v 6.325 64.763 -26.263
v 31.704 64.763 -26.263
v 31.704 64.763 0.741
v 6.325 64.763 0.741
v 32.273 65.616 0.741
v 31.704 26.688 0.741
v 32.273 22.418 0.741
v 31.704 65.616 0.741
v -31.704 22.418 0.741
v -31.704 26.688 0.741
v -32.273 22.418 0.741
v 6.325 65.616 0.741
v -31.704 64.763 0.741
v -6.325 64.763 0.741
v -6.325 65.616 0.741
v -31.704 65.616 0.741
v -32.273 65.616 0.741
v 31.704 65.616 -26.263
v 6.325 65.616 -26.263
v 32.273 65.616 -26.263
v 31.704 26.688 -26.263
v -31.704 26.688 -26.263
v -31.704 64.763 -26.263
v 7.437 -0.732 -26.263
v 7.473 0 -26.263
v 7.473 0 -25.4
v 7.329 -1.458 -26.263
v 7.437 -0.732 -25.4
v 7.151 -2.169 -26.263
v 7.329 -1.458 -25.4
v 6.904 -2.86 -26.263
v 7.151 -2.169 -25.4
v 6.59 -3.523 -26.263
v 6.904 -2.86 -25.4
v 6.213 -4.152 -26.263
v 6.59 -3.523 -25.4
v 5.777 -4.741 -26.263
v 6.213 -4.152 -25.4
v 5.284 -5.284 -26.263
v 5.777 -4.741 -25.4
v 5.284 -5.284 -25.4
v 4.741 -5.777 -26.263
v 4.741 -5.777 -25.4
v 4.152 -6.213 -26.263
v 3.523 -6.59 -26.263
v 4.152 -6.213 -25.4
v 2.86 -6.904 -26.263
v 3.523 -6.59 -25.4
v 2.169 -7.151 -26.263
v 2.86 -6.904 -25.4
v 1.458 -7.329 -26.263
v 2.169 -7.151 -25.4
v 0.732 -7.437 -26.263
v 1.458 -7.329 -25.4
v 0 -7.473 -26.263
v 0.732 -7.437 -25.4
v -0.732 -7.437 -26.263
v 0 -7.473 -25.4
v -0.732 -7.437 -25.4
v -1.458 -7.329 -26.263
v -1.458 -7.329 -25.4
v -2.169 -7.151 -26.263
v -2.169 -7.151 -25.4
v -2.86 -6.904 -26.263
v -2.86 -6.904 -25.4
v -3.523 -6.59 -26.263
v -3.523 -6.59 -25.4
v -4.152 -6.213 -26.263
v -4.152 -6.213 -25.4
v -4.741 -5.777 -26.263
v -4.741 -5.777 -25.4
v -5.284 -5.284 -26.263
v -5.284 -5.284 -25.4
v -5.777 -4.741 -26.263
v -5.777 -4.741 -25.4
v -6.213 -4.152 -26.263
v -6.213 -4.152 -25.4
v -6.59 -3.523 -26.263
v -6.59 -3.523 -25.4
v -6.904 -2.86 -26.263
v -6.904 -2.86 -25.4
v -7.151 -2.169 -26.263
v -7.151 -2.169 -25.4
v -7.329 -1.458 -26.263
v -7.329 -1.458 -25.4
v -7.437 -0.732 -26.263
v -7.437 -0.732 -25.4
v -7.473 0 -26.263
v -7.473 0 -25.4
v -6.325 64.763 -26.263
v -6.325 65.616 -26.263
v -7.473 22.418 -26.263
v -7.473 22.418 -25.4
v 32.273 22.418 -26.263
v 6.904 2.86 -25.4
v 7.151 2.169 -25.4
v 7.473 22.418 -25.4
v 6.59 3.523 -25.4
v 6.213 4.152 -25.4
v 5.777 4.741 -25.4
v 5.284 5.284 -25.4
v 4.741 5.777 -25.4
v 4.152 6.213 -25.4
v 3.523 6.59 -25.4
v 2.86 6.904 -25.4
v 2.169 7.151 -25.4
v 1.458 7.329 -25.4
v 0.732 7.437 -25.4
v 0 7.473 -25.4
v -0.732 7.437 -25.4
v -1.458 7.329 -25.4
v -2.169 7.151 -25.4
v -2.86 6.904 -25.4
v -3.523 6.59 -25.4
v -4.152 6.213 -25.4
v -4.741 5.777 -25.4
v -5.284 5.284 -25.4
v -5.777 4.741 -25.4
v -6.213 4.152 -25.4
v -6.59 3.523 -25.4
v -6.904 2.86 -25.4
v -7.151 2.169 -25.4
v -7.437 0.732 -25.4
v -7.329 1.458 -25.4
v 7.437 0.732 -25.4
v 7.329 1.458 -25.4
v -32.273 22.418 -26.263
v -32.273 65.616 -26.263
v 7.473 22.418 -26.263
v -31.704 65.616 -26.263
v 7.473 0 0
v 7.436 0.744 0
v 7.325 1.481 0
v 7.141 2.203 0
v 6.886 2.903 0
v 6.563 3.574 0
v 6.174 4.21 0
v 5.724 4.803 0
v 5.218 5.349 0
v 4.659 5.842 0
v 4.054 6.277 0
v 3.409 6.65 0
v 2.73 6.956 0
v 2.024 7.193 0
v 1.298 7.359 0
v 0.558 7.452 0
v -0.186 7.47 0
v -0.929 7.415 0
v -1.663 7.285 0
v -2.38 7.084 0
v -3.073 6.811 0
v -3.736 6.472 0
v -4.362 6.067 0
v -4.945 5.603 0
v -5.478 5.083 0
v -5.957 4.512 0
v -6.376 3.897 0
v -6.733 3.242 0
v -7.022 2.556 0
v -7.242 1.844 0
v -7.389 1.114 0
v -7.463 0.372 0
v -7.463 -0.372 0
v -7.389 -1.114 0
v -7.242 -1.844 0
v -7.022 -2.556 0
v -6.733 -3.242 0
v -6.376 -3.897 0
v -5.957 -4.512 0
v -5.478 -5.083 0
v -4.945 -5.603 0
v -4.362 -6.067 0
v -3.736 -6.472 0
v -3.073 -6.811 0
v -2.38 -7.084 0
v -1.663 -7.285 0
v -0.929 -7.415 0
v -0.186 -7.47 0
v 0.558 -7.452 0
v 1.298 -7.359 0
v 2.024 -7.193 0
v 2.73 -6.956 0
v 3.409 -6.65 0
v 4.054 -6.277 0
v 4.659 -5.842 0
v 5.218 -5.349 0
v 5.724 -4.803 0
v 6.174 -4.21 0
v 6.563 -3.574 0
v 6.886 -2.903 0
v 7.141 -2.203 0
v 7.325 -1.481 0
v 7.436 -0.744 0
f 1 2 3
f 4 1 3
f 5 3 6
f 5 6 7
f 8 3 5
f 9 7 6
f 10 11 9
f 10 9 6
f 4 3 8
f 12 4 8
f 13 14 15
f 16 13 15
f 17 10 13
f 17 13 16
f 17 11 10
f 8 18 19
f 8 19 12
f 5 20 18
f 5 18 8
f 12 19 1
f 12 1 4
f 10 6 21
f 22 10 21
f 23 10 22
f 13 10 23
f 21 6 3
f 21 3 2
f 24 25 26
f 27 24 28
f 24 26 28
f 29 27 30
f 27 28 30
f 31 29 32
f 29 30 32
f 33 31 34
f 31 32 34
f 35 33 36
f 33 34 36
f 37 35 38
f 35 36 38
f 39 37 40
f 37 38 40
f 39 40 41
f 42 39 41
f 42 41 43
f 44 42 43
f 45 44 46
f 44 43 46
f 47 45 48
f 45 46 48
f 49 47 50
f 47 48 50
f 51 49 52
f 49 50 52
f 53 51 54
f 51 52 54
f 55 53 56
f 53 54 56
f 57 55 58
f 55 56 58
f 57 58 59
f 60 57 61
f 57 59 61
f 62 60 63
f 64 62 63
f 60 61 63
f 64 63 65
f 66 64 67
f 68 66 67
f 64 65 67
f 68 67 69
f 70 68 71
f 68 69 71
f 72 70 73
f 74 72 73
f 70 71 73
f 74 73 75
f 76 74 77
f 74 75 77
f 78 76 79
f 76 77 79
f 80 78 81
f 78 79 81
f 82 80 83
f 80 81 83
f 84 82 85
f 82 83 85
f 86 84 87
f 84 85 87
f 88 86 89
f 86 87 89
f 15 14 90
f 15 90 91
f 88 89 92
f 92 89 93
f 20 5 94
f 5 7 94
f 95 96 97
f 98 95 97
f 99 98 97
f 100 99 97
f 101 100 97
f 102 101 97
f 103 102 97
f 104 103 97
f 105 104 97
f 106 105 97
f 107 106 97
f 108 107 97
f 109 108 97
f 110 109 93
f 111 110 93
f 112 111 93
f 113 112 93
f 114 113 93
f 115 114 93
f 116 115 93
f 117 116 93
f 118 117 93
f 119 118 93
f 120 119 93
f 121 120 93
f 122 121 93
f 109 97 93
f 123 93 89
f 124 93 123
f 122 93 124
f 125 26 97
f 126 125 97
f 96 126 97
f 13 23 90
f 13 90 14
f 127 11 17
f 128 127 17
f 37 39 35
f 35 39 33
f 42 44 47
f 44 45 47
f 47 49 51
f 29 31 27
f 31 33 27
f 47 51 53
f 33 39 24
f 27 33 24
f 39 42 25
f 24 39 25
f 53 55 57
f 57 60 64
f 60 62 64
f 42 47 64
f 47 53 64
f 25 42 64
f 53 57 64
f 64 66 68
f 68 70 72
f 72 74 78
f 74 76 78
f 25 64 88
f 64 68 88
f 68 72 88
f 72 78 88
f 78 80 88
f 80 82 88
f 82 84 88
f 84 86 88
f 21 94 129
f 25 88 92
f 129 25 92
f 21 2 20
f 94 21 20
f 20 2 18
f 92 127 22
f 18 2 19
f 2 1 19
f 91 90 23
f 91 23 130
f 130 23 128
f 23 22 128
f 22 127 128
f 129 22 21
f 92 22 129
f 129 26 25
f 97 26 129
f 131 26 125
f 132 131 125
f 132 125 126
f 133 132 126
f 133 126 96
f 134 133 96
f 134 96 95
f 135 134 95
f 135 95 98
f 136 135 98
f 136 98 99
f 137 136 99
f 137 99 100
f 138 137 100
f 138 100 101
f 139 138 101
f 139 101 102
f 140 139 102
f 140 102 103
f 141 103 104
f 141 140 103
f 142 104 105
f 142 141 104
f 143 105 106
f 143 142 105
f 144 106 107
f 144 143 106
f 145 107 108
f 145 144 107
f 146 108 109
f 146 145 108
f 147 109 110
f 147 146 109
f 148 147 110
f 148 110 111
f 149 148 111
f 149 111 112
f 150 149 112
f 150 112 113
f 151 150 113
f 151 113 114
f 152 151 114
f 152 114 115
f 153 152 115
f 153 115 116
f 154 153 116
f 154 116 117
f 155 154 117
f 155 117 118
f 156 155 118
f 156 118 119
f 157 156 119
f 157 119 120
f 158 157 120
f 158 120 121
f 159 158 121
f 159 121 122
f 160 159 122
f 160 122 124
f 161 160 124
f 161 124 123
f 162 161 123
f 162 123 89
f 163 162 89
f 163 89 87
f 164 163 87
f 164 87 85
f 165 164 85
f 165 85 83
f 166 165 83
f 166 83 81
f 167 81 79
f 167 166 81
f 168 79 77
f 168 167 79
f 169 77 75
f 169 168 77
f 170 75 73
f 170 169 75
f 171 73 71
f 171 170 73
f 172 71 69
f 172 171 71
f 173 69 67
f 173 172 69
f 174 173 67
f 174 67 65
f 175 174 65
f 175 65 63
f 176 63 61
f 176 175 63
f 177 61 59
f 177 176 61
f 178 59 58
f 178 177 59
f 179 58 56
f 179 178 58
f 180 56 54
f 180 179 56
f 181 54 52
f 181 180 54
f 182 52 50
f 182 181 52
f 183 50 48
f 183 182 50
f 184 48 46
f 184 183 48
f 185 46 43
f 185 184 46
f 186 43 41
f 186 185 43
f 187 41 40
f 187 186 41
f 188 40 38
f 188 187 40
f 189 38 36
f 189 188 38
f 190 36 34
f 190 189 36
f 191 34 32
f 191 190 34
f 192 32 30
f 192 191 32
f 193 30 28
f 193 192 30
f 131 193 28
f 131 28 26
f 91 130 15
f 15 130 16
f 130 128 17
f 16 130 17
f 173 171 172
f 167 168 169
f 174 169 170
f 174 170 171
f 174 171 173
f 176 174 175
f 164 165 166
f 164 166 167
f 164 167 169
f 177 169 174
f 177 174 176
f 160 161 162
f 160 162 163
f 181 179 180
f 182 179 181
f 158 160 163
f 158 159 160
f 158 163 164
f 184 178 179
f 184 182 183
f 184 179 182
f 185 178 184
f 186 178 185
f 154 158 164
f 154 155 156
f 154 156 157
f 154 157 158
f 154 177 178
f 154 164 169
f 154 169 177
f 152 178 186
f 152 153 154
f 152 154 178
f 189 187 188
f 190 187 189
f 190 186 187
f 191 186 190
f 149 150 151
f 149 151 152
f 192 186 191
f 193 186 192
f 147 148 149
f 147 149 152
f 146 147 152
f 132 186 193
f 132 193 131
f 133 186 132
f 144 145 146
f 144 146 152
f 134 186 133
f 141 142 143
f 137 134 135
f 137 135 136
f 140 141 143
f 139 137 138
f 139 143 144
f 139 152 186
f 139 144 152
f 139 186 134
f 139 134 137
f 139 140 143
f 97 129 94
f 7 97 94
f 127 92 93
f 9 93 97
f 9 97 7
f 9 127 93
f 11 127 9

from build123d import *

# Parameters (mm, degrees)
SKETCH1_R           = 7.472749452
BOSS_EXTRUDE1_DEPTH = 25.4
BOSS_EXTRUDE2_DEPTH = 0.863350236
SKETCH4_W           = 63.40856
SKETCH4_H           = 4.26981756
BOSS_EXTRUDE3_DEPTH = 27.00421054
SKETCH6_W           = 27.00421054
SKETCH6_H           = 4.26981756
BOSS_EXTRUDE4_DEPTH = 0.56888896
SKETCH7_W           = 0.56888896
SKETCH7_H           = 27.00421054
BOSS_EXTRUDE5_DEPTH = 38.0746
SKETCH8_W           = 0.56888896
SKETCH8_H           = 27.00421054
BOSS_EXTRUDE6_DEPTH = 0.853447309
SKETCH9_W           = 27.00421054
SKETCH9_H           = 0.853447309
BOSS_EXTRUDE7_DEPTH = 25.37968


with BuildPart() as part:
    # Sketch1 → Boss-Extrude1 (new body)
    with BuildSketch(Plane.XY):
        Circle(SKETCH1_R)
    extrude(amount=-BOSS_EXTRUDE1_DEPTH)

    # Sketch2 → Boss-Extrude2 (add)
    with BuildSketch(Plane(origin=(0, 0, -25.4), x_dir=(-1, 0, 0), z_dir=(0, 0, -1))):
        with BuildLine():
            Line((-7.472749452, 22.418248356), (-7.472749452, 0))
            ThreePointArc((-7.472749452, 0), (0, -7.472749452), (7.472749452, 0))
            Line((7.472749452, 0), (7.472749452, 22.418248356))
            Line((7.472749452, 22.418248356), (-7.472749452, 22.418248356))
        make_face()
    extrude(amount=BOSS_EXTRUDE2_DEPTH)

    # Sketch4 → Boss-Extrude3 (add)
    with BuildSketch(Plane(origin=(0, 0, -26.263350236), x_dir=(-1, 0, 0), z_dir=(0, 0, -1))):
        with Locations((0, 24.553157136)):
            Rectangle(SKETCH4_W, SKETCH4_H)
    extrude(amount=-BOSS_EXTRUDE3_DEPTH)

    # Sketch6 → Boss-Extrude4 (add)
    with BuildSketch(Plane(origin=(31.70428, 0, 0), x_dir=(0, 0, -1), z_dir=(1, 0, 0))):
        with Locations((12.761244966, 24.553157136)):
            Rectangle(SKETCH6_W, SKETCH6_H)
    boss_extrude4 = extrude(amount=BOSS_EXTRUDE4_DEPTH)

    # Sketch7 → Boss-Extrude5 (add)
    with BuildSketch(Plane(origin=(0, 26.688065916, 0), x_dir=(1, 0, 0), z_dir=(0, 1, 0))):
        with Locations((31.98872448, 12.761244966)):
            Rectangle(SKETCH7_W, SKETCH7_H)
    boss_extrude5 = extrude(amount=BOSS_EXTRUDE5_DEPTH)

    # Sketch8 → Boss-Extrude6 (add)
    with BuildSketch(Plane(origin=(0, 64.762665916, 0), x_dir=(1, 0, 0), z_dir=(0, 1, 0))):
        with Locations((31.98872448, 12.761244966)):
            Rectangle(SKETCH8_W, SKETCH8_H)
    boss_extrude6 = extrude(amount=BOSS_EXTRUDE6_DEPTH)

    # Sketch9 → Boss-Extrude7 (add)
    with BuildSketch(Plane.ZY.offset(-31.70428)):
        with Locations((-12.761244966, 65.18938957)):
            Rectangle(SKETCH9_W, SKETCH9_H)
    boss_extrude7 = extrude(amount=BOSS_EXTRUDE7_DEPTH)

    # Mirror1: Boss-Extrude4, Boss-Extrude5, Boss-Extrude6, Boss-Extrude7 across plane
    add(boss_extrude4.mirror(Plane(origin=(0, 0, 0), x_dir=(0, 0, 1), z_dir=(1, 0, 0))))
    add(boss_extrude5.mirror(Plane(origin=(0, 0, 0), x_dir=(0, 0, 1), z_dir=(1, 0, 0))))
    add(boss_extrude6.mirror(Plane(origin=(0, 0, 0), x_dir=(0, 0, 1), z_dir=(1, 0, 0))))
    add(boss_extrude7.mirror(Plane(origin=(0, 0, 0), x_dir=(0, 0, 1), z_dir=(1, 0, 0))))


solid = part.part
